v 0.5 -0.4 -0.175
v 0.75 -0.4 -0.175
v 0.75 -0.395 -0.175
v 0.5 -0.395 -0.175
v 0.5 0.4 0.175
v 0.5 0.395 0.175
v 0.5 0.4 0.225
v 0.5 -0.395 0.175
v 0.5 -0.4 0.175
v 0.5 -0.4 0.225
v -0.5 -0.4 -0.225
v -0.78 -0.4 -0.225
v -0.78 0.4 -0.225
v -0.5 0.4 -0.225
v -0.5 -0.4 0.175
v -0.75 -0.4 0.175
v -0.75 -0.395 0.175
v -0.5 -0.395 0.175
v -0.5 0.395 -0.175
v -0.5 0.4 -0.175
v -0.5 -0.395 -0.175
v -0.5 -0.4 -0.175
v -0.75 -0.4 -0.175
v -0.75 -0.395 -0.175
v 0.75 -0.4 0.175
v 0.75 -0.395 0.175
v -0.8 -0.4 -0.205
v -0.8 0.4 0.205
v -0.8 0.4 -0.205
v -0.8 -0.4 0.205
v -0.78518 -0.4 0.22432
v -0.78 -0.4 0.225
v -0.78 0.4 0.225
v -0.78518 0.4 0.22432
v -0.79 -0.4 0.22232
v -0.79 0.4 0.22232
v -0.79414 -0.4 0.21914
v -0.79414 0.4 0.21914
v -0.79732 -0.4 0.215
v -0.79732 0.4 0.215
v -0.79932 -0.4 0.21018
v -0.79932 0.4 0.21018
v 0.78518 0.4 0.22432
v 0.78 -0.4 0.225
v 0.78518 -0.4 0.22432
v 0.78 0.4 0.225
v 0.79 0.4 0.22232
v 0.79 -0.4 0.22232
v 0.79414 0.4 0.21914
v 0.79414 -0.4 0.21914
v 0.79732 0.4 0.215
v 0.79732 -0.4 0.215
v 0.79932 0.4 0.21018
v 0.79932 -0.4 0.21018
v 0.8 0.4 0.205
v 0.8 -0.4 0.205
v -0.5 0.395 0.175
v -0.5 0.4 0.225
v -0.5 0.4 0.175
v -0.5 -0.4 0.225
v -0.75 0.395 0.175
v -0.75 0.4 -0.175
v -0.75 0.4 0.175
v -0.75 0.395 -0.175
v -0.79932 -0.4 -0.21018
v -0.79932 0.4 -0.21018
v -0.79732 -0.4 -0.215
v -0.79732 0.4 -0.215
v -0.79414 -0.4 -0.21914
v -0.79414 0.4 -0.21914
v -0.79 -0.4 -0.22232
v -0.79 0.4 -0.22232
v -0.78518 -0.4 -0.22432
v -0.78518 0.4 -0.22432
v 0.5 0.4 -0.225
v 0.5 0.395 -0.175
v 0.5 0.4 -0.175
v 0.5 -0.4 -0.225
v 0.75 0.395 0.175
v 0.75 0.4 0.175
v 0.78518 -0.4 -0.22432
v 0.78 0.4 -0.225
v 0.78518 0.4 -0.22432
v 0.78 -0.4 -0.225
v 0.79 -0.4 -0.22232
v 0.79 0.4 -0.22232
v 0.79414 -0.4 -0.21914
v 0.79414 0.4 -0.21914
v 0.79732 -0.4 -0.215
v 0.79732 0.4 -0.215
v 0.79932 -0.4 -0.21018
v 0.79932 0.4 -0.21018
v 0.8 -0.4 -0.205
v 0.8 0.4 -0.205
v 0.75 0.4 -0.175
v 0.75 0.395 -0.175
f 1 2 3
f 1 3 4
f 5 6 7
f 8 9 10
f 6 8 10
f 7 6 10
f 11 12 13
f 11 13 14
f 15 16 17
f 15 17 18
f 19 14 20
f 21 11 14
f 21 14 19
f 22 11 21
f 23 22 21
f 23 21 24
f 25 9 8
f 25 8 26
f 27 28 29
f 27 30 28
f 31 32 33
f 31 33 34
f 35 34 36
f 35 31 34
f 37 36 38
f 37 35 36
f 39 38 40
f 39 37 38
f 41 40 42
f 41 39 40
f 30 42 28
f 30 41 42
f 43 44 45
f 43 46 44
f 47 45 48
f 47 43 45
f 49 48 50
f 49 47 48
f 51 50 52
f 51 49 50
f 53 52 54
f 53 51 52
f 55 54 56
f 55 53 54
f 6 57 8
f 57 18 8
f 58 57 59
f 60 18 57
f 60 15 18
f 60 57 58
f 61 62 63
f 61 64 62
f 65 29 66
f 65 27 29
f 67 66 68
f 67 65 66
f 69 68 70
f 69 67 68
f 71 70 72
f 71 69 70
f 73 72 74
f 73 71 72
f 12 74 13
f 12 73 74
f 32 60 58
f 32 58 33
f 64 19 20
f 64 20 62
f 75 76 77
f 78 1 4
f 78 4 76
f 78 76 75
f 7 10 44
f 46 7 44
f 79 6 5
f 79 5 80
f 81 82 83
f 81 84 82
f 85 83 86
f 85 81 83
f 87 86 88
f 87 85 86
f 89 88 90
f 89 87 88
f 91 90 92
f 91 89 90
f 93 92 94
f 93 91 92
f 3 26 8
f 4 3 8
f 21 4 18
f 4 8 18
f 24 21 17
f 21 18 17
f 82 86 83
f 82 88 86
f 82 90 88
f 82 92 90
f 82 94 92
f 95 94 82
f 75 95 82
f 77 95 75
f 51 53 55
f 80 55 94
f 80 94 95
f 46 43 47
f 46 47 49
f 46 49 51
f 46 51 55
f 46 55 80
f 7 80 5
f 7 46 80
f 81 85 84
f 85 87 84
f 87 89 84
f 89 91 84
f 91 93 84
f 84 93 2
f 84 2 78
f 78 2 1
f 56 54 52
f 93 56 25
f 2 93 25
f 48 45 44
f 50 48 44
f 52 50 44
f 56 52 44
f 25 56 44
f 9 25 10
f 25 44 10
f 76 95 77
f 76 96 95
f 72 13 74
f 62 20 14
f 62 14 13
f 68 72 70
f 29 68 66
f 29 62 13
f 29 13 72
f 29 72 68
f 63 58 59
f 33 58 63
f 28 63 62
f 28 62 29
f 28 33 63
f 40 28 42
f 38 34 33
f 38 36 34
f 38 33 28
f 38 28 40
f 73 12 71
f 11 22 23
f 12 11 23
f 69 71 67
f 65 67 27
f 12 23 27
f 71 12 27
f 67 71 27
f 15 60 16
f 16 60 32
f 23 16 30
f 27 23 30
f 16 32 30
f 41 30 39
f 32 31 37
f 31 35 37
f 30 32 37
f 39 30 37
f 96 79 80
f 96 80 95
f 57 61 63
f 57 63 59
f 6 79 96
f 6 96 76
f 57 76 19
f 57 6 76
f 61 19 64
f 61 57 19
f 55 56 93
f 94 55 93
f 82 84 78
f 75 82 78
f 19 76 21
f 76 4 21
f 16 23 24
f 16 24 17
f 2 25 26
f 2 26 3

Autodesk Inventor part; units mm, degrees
ref_plane "YZ Plane" through (0, 0, 0) normal (1, 0, 0) x (0, 1, 0)
ref_plane "XZ Plane" through (0, 0, 0) normal (0, 1, 0) x (-1, 0, 0)
ref_plane "XY Plane" through (0, 0, 0) normal (0, 0, 1) x (1, 0, 0)
sketch "Sketch1" plane through (0, 0, 0) normal (0, 1, 0) x (-1, 0, 0)
  line L0 (0.75, 0.175) -> (-0.75, 0.175)
  line L1 (-0.75, 0.175) -> (-0.75, -0.175)
  line L2 (-0.75, -0.175) -> (0.75, -0.175)
  line L3 (0.75, -0.175) -> (0.75, 0.175)
  line L4 (0.5, 0.175) -> (0.5, 0.225)
  line L5 (0.5, 0.225) -> (0.8, 0.225)
  line L6 (0.8, 0.225) -> (0.8, -0.225)
  line L7 (0.8, -0.225) -> (0.5, -0.225)
  line L8 (0.5, -0.225) -> (0.5, -0.175)
  line L9 (-0.5, 0.175) -> (-0.5, 0.225)
  line L10 (-0.5, 0.225) -> (-0.8, 0.225)
  line L11 (-0.8, 0.225) -> (-0.8, -0.225)
  line L12 (-0.8, -0.225) -> (-0.5, -0.225)
  line L13 (-0.5, -0.175) -> (-0.5, -0.225)
  line L14 (0.5, 0.175) -> (-0.5, 0.175)
  point P0 (0, 0)
  point P1 (0, 0.175)
  point P2 (0.75, 0)
  dimension "d0" = 1.6
  dimension "d1" = 0.05
  dimension "d2" = 0.05
  dimension "d3" = 0.45
  dimension "d4" = 0.3
extrude "Extrusion1" add sketch "Sketch1" along normal mid plane 0.8 contours L0 L4 L5 L6 L7 L8 L2 L3 | L0 L1 L2 L13 L12 L11 L10 L9
extrude "Extrusion2" add sketch "Sketch1" along normal mid plane 0.79 contours L3 L2 L1 L0
fillet "Fillet1" radius 0.02 4 edges at (-0.8, 0, 0.225) (-0.8, 0, -0.225) (0.8, 0, 0.225) (0.8, 0, -0.225)
equation "\"d2\" = d1"
properties part number "21-1001" material "Copper"
